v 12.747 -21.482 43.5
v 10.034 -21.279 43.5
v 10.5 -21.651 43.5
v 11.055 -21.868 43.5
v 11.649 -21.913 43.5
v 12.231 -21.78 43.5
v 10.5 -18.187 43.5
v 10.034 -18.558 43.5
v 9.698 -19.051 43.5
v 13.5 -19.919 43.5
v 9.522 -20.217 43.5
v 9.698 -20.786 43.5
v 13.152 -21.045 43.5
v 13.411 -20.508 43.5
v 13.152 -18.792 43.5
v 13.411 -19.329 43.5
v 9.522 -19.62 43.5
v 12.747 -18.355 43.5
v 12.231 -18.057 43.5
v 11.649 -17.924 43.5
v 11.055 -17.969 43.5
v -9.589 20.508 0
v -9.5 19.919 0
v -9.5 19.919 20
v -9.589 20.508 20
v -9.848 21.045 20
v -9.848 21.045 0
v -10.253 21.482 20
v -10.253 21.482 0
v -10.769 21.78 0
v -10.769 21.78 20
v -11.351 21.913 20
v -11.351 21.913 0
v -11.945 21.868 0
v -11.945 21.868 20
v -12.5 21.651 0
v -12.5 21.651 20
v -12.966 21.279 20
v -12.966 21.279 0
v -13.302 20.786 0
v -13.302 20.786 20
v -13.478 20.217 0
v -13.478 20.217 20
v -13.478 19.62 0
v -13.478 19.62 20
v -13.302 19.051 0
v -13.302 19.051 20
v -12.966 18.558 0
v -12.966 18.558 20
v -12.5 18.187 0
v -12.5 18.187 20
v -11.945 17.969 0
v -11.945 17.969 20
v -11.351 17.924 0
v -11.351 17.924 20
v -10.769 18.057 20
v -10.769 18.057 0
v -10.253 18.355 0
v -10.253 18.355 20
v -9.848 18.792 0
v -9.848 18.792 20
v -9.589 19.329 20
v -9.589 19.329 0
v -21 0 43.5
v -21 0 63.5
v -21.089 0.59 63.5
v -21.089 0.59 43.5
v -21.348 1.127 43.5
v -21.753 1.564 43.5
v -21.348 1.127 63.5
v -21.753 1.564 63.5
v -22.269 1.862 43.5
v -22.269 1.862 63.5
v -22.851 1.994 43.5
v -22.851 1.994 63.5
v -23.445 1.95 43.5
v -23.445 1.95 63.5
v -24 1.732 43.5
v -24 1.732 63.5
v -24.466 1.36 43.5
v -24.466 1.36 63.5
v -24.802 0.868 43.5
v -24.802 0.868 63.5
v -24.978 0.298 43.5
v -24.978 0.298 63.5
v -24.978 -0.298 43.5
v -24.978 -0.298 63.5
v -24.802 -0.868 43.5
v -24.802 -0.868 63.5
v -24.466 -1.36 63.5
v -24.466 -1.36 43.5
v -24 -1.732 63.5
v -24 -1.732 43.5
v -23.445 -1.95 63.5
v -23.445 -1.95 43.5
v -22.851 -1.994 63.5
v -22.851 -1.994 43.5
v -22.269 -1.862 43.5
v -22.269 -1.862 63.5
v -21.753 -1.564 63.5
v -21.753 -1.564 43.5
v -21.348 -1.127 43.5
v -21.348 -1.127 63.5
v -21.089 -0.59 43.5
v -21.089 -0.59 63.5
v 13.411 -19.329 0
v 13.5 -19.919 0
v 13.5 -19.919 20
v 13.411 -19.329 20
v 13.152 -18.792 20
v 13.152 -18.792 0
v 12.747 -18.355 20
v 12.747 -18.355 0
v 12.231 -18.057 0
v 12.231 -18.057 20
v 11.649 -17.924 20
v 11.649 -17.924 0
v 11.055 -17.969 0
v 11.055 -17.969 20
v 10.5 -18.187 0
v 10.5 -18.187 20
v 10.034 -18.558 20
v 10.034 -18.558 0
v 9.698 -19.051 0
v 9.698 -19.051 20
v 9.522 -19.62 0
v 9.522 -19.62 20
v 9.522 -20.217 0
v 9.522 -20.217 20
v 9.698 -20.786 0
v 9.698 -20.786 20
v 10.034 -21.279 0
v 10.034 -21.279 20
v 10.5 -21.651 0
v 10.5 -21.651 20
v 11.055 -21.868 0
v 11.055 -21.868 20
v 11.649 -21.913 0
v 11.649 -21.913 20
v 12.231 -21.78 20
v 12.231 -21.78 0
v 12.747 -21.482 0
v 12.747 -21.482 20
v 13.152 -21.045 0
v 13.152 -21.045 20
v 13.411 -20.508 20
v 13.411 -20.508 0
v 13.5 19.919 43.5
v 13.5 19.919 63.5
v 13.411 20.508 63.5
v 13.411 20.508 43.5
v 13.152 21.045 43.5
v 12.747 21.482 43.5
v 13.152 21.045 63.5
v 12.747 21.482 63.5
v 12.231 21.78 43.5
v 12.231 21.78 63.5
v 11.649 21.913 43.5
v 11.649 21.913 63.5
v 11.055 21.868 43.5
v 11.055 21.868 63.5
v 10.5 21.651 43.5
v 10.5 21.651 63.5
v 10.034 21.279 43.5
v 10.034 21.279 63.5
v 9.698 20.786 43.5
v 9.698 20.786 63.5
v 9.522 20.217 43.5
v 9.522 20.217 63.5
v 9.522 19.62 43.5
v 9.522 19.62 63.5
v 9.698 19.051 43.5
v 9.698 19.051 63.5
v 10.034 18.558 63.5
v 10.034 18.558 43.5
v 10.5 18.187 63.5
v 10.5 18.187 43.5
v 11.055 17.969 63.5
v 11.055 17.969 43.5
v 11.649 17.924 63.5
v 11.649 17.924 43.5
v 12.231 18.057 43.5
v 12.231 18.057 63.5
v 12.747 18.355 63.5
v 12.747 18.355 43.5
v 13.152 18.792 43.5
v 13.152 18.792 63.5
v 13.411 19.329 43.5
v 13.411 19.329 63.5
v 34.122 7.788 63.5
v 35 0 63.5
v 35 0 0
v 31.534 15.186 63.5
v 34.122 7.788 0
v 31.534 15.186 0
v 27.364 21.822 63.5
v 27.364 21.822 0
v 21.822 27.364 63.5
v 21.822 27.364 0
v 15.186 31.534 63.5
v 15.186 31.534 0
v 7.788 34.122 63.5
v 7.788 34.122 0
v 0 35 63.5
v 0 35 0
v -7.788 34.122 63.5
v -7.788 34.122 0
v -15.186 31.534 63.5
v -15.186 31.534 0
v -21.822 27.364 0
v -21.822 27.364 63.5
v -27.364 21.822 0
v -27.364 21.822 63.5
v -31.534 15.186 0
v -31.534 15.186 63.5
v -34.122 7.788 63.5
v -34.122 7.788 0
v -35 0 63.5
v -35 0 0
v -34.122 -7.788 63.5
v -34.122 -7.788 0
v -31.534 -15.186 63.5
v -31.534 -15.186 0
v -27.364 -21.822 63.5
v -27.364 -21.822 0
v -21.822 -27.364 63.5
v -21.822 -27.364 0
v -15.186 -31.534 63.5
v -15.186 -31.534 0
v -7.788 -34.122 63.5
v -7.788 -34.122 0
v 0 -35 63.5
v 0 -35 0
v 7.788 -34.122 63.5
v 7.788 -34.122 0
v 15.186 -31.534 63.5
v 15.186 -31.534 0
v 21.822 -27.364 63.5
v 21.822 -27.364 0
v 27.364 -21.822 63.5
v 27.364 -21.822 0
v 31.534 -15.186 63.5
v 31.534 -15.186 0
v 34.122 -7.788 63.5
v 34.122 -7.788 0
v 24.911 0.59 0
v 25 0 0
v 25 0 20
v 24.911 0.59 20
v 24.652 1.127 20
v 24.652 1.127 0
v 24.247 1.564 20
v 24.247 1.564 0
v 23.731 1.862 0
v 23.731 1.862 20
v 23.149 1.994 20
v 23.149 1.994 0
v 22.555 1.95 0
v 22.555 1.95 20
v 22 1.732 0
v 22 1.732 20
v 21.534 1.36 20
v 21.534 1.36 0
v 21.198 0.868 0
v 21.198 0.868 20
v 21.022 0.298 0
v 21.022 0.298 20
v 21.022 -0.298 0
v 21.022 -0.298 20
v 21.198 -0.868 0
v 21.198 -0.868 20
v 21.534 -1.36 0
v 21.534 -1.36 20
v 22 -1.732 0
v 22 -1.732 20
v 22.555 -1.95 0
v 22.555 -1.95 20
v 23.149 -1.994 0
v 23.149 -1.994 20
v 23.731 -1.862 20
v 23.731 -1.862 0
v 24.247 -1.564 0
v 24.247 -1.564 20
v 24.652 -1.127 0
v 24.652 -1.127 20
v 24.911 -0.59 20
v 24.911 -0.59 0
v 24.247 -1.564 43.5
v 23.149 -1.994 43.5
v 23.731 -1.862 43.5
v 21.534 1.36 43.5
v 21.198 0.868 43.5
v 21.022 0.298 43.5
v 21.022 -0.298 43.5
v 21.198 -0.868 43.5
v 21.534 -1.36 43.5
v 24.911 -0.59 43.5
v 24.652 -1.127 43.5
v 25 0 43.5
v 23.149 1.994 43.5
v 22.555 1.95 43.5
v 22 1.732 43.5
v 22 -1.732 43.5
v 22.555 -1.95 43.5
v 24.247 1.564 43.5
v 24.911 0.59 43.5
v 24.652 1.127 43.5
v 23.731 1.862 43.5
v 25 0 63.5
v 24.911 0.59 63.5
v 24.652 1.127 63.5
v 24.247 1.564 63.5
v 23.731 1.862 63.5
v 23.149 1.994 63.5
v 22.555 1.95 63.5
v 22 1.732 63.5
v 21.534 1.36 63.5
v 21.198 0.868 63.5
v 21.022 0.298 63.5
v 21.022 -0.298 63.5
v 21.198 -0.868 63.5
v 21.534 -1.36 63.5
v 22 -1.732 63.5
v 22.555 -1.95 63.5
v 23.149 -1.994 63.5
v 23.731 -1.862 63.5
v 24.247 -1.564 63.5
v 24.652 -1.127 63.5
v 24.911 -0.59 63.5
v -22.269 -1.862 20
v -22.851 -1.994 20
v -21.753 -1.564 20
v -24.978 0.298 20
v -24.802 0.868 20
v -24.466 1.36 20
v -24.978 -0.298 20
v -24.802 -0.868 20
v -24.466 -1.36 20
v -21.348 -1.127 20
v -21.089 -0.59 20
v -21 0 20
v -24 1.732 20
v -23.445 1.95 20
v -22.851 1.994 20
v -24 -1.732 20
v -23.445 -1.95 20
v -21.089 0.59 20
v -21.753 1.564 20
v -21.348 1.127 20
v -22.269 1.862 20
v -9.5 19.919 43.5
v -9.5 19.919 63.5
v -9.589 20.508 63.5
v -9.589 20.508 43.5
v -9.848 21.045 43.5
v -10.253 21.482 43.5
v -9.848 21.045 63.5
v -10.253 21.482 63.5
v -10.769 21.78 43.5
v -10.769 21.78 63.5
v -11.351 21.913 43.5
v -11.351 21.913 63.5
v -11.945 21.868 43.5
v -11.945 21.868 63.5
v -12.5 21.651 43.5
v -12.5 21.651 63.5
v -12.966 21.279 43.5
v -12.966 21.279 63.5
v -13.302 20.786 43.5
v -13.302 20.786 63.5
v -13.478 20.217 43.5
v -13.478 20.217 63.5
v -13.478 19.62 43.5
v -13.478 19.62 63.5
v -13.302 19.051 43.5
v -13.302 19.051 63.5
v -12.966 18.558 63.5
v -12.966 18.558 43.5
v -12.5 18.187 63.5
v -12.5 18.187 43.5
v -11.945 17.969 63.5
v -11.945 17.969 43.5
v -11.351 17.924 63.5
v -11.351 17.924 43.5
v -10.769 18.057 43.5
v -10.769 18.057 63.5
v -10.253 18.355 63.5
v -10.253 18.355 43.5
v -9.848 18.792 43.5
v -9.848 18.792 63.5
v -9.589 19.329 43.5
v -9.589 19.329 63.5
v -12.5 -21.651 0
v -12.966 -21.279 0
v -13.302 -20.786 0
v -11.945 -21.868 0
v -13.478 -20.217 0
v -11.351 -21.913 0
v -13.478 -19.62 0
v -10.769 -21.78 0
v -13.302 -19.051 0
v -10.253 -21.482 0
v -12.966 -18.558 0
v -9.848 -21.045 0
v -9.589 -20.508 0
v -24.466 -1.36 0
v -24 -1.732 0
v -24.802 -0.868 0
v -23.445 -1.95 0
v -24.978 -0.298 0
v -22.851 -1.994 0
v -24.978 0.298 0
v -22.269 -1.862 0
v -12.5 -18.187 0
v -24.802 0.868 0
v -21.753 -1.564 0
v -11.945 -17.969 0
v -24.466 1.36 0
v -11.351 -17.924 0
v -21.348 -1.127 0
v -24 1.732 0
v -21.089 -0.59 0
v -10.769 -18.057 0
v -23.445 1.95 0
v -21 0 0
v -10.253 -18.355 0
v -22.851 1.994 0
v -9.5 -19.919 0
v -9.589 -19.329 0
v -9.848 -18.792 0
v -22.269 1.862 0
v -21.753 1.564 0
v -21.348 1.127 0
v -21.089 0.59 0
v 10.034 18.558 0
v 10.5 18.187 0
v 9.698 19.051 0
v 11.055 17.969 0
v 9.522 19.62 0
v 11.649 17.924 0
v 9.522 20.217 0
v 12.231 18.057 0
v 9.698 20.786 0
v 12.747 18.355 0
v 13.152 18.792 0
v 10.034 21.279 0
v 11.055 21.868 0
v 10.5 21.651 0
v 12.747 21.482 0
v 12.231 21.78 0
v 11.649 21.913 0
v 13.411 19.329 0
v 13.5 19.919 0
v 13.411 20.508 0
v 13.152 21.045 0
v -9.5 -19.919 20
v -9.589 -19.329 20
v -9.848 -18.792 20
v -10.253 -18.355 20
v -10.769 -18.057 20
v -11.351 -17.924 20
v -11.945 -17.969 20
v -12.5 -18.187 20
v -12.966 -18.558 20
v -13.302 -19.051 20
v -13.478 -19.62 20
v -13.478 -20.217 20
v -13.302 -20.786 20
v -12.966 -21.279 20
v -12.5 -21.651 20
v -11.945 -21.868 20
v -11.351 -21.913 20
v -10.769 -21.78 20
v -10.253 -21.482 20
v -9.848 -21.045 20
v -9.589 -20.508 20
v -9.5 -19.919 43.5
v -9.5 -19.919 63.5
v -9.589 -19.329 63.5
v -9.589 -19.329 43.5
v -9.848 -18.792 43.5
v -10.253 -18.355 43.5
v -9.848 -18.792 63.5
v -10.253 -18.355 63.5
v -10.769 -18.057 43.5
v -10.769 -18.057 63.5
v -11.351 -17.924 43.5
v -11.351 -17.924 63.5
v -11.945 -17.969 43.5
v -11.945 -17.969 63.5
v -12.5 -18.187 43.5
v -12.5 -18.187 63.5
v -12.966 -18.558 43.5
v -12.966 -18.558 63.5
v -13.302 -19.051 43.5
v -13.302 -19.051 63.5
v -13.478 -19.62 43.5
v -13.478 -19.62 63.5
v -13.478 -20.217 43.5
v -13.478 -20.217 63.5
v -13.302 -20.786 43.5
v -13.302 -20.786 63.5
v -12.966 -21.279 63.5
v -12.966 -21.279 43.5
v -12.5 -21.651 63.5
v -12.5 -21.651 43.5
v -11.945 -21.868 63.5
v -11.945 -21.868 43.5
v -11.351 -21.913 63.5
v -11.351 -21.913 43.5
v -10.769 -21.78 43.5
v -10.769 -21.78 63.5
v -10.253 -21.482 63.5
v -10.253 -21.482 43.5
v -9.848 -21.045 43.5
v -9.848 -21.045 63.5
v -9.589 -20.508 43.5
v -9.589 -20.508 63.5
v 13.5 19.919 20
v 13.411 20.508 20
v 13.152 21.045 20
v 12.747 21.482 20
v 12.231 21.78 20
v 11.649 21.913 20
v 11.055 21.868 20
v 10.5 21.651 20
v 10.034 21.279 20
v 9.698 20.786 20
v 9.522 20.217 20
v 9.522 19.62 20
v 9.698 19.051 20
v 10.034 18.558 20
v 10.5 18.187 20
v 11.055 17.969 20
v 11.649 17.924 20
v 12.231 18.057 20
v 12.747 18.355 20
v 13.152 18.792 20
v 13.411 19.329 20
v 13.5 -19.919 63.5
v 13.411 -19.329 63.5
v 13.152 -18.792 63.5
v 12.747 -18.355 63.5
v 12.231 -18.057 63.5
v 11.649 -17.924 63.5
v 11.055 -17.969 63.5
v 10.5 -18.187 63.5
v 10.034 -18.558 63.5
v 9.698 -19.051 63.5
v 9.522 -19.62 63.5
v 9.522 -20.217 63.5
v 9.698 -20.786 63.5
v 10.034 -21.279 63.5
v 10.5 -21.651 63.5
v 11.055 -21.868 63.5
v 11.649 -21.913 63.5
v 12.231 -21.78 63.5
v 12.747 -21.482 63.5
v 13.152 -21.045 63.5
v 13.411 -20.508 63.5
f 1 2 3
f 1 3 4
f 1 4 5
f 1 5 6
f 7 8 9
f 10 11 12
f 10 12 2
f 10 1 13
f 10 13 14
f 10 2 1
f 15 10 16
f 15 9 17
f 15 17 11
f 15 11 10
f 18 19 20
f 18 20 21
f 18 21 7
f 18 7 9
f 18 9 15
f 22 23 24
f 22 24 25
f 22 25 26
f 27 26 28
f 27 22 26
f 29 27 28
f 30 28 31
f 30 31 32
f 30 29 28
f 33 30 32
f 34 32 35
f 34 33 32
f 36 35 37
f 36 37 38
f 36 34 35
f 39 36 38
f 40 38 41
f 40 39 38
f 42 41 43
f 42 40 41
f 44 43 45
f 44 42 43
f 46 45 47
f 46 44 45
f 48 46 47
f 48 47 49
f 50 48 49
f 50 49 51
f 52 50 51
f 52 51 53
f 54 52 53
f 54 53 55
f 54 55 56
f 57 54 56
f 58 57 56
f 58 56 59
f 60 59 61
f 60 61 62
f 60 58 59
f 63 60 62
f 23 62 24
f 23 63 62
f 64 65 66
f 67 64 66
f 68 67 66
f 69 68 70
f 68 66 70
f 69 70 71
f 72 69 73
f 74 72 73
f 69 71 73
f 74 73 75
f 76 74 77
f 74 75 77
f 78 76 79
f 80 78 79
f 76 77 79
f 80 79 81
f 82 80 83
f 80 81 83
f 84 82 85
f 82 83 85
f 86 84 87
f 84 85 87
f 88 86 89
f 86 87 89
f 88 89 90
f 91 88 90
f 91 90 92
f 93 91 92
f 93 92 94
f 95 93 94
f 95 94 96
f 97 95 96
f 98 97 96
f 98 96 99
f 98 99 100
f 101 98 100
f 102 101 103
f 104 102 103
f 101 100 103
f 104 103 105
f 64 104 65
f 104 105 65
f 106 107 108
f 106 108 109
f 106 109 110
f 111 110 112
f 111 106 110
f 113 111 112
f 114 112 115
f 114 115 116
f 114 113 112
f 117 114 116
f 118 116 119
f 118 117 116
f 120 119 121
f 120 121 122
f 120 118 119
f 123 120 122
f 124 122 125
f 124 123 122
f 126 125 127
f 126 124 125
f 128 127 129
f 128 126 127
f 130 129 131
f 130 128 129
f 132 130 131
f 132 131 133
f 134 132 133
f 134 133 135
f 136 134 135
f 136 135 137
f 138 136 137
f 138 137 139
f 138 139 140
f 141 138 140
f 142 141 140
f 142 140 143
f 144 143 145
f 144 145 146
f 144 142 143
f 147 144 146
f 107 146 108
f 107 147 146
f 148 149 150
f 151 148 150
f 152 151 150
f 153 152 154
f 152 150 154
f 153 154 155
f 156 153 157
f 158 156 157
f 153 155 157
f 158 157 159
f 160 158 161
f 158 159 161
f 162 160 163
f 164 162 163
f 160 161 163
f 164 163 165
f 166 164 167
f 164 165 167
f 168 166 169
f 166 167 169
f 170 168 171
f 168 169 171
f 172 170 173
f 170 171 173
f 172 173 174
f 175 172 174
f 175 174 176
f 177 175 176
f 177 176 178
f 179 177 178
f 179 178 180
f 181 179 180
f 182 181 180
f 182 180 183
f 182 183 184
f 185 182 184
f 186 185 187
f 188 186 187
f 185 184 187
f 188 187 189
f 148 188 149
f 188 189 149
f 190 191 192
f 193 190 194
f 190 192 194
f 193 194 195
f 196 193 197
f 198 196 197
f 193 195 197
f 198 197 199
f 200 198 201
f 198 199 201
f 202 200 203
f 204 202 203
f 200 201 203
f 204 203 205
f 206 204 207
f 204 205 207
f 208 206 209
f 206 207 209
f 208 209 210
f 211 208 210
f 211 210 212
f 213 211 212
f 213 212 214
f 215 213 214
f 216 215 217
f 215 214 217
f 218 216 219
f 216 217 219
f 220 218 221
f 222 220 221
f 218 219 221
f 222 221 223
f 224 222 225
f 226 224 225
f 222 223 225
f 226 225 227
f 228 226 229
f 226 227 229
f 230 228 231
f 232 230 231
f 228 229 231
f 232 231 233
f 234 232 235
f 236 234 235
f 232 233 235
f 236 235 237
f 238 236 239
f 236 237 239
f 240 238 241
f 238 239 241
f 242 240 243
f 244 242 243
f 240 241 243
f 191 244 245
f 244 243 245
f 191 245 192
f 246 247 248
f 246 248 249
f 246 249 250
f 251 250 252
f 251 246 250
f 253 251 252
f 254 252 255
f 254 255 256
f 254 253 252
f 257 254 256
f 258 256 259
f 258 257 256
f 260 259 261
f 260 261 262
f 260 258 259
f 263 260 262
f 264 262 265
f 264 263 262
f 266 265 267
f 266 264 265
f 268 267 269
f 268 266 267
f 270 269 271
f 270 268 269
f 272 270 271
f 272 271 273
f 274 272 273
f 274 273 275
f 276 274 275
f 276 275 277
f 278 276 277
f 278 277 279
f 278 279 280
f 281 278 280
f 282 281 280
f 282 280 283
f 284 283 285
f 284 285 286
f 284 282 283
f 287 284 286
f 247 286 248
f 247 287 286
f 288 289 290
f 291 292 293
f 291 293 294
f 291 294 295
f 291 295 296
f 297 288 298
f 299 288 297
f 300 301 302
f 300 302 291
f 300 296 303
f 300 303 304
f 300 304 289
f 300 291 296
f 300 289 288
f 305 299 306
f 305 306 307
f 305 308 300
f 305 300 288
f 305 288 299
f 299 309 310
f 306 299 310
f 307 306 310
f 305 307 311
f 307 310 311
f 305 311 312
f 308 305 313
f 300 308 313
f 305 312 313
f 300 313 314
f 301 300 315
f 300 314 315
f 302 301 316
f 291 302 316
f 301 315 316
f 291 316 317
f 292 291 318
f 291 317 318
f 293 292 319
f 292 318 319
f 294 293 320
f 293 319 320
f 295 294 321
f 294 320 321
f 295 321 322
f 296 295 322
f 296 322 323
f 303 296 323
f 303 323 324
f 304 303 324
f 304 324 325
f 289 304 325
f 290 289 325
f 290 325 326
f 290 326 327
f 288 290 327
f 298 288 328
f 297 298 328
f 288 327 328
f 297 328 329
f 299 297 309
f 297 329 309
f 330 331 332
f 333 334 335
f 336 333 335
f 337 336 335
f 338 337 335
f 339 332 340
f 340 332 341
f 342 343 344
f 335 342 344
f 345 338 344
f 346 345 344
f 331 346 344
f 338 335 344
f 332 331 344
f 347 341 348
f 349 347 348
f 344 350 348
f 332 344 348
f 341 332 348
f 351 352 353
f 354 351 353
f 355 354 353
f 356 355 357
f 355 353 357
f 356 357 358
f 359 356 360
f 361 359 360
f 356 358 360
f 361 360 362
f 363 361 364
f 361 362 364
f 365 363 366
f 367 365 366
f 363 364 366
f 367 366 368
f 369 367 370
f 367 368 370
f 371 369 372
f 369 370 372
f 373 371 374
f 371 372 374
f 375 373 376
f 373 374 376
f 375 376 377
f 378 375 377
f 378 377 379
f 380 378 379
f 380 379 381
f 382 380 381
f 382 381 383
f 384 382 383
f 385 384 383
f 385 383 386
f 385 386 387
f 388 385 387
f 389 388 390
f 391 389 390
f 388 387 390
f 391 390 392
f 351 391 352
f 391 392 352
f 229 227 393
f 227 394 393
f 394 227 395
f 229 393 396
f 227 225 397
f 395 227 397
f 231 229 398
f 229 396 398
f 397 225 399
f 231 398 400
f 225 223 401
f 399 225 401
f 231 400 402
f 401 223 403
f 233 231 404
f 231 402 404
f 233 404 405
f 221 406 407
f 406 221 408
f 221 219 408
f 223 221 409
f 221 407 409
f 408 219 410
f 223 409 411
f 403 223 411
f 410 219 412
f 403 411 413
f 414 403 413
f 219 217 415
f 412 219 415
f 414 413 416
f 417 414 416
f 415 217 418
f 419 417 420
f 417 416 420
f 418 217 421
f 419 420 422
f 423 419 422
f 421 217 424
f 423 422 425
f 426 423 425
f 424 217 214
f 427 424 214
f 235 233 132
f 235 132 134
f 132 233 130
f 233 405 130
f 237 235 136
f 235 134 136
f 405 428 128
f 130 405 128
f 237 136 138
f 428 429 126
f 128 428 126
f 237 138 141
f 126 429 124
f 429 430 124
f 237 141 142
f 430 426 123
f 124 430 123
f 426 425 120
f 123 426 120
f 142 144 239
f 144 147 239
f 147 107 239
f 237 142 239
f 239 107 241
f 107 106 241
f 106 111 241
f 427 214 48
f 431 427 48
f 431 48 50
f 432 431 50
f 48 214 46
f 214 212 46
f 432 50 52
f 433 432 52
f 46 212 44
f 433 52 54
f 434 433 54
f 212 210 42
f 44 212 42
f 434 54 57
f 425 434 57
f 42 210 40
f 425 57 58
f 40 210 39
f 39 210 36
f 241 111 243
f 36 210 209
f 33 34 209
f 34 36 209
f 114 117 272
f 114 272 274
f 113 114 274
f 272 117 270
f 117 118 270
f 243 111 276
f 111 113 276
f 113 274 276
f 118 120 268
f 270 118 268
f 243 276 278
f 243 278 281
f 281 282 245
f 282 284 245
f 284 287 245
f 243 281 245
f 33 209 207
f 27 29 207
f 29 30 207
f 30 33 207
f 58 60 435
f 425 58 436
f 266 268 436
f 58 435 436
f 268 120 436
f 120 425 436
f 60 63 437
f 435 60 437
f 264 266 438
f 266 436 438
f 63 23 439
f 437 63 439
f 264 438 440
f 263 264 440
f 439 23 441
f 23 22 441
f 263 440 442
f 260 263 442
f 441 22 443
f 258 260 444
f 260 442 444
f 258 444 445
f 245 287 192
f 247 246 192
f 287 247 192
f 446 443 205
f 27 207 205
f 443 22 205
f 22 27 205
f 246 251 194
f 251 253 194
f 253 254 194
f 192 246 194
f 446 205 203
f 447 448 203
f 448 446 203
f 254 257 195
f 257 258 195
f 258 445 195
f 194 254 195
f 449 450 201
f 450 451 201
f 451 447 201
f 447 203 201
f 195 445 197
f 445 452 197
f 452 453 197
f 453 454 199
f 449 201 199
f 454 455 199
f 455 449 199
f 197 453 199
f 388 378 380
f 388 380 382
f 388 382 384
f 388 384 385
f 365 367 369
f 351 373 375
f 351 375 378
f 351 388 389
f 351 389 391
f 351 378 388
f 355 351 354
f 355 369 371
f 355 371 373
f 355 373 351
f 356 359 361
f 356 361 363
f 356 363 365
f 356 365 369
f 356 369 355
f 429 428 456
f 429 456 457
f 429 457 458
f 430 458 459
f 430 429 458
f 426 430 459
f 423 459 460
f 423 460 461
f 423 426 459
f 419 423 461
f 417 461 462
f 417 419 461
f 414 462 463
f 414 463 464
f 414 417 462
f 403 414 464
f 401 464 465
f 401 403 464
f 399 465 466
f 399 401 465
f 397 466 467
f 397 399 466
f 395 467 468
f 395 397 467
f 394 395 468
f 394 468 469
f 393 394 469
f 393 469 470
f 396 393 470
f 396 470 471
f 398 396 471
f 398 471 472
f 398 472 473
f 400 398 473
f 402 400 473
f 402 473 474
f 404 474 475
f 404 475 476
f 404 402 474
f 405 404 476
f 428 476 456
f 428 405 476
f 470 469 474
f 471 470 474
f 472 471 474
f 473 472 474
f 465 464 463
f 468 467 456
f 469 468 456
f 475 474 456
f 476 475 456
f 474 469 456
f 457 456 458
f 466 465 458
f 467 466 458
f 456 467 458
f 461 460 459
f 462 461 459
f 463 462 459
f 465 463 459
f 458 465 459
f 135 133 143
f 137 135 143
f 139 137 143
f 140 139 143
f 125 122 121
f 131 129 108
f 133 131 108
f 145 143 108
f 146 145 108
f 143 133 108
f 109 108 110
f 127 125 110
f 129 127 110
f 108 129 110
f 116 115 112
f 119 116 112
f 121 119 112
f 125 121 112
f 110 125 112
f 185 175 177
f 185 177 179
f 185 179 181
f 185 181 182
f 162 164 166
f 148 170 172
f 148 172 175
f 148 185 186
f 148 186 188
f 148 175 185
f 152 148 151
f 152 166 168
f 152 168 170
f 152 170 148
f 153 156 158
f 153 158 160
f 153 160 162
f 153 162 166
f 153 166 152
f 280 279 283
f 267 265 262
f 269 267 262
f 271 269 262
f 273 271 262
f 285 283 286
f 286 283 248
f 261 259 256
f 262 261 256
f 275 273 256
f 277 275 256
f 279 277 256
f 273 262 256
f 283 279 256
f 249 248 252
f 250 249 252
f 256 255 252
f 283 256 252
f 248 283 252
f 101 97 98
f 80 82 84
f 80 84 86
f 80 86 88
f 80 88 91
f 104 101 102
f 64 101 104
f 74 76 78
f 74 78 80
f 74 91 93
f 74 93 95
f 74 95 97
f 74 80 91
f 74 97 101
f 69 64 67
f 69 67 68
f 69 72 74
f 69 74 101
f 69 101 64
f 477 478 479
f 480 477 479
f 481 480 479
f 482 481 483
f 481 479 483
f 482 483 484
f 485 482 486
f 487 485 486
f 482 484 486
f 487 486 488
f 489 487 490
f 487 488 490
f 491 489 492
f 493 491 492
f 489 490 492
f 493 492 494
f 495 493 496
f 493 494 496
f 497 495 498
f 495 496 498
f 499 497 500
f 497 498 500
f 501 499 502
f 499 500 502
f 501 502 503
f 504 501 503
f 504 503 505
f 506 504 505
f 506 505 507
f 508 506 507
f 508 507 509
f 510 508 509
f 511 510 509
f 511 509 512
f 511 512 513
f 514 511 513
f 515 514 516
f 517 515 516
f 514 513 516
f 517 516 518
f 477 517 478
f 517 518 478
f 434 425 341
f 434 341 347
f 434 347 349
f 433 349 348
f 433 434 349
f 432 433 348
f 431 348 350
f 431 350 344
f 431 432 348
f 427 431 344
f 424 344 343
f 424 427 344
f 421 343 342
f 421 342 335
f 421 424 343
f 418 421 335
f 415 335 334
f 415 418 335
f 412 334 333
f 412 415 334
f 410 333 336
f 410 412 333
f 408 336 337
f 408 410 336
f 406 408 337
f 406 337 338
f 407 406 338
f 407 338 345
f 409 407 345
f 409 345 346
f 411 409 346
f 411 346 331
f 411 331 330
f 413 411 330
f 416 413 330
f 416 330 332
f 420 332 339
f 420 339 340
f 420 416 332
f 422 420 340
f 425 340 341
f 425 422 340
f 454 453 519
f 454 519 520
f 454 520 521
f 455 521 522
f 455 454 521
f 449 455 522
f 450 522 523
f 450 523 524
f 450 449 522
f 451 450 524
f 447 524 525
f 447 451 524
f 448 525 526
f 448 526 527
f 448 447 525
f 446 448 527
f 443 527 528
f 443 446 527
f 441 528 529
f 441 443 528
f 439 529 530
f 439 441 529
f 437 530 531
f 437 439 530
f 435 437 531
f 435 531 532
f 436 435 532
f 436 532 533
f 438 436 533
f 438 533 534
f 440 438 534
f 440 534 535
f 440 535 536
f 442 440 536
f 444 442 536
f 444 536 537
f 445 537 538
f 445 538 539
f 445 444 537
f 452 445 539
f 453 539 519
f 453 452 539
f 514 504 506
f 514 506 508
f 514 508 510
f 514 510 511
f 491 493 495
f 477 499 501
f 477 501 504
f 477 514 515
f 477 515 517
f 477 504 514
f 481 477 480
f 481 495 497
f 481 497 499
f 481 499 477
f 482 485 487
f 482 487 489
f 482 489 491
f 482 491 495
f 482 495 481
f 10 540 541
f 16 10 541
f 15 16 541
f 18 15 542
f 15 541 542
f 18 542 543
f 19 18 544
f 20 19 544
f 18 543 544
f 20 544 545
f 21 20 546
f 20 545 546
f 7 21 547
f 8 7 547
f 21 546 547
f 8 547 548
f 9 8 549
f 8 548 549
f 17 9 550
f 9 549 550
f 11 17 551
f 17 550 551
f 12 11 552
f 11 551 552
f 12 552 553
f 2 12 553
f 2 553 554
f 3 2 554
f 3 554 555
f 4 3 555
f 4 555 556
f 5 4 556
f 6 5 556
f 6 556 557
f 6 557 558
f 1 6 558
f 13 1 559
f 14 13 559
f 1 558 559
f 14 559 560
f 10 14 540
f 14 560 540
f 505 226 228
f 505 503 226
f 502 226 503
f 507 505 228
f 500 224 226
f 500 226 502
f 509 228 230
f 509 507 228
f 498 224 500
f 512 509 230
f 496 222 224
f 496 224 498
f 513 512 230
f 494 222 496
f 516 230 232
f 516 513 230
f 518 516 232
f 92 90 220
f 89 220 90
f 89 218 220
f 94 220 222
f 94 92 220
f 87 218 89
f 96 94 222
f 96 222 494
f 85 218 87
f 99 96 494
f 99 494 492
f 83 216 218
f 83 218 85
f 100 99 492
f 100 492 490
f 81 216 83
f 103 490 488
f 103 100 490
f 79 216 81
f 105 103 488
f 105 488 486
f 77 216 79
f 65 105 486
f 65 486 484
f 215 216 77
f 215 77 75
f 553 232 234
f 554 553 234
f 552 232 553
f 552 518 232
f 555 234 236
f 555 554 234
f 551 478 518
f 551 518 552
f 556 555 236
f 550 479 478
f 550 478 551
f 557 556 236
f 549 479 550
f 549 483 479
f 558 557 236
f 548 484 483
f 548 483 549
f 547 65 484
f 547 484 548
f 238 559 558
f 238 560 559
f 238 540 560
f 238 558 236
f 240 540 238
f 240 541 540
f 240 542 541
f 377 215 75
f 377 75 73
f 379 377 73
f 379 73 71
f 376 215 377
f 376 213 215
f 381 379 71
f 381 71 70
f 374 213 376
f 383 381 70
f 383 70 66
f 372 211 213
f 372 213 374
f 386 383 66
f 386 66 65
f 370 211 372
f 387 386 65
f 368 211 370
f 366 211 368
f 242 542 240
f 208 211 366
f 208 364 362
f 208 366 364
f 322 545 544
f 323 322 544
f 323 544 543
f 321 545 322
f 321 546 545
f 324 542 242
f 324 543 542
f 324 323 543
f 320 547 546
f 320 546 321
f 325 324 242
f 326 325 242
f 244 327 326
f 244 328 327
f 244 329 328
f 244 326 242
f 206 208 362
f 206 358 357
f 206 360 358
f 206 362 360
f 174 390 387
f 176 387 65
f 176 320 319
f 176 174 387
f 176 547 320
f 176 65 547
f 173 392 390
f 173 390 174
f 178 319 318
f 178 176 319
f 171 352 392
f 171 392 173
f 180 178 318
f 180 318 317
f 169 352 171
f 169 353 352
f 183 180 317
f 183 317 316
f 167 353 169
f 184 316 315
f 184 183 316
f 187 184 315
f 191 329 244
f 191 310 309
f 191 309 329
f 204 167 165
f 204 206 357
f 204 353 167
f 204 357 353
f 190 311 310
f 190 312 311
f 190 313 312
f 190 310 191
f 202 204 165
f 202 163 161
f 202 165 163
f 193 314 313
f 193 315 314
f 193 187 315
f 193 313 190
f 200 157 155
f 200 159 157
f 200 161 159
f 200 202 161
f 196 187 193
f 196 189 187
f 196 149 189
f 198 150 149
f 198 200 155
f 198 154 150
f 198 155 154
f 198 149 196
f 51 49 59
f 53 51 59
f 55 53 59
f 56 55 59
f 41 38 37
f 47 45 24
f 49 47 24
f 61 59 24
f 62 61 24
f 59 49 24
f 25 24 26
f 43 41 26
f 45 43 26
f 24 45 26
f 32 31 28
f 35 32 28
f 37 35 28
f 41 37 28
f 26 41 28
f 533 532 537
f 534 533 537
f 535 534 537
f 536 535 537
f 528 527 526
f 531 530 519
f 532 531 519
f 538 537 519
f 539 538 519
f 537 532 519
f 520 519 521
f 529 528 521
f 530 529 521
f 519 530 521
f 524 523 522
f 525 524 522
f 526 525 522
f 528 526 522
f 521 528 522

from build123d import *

# Parameters (mm, degrees)
SKETCH_1_R          = 35
EXTRUDE_2_DEPTH     = 63.5
SKETCH_3_R          = 2
CUT_EXTRUDE_1_DEPTH = 20


with BuildPart() as part:
    # 草图1 → 凸台-拉伸2 (new body)
    with BuildSketch(Plane.XY):
        Circle(SKETCH_1_R)
    extrude(amount=EXTRUDE_2_DEPTH)

    # 草图3 → 切除-拉伸1 (cut)
    with BuildSketch(Plane.XY.offset(63.5)):
        with Locations((-23, 0)):
            Circle(SKETCH_3_R)
        with Locations((-11.5, 19.918584287)):
            Circle(SKETCH_3_R)
        with Locations((11.5, 19.918584287)):
            Circle(SKETCH_3_R)
        with Locations((23, 0)):
            Circle(SKETCH_3_R)
        with Locations((11.5, -19.918584287)):
            Circle(SKETCH_3_R)
        with Locations((-11.5, -19.918584287)):
            Circle(SKETCH_3_R)
    cut_extrude_1 = extrude(amount=-CUT_EXTRUDE_1_DEPTH, mode=Mode.SUBTRACT)

    # 镜向1: 切除-拉伸1 across plane
    add(cut_extrude_1.mirror(Plane.XY.offset(31.75)), mode=Mode.SUBTRACT)


solid = part.part
